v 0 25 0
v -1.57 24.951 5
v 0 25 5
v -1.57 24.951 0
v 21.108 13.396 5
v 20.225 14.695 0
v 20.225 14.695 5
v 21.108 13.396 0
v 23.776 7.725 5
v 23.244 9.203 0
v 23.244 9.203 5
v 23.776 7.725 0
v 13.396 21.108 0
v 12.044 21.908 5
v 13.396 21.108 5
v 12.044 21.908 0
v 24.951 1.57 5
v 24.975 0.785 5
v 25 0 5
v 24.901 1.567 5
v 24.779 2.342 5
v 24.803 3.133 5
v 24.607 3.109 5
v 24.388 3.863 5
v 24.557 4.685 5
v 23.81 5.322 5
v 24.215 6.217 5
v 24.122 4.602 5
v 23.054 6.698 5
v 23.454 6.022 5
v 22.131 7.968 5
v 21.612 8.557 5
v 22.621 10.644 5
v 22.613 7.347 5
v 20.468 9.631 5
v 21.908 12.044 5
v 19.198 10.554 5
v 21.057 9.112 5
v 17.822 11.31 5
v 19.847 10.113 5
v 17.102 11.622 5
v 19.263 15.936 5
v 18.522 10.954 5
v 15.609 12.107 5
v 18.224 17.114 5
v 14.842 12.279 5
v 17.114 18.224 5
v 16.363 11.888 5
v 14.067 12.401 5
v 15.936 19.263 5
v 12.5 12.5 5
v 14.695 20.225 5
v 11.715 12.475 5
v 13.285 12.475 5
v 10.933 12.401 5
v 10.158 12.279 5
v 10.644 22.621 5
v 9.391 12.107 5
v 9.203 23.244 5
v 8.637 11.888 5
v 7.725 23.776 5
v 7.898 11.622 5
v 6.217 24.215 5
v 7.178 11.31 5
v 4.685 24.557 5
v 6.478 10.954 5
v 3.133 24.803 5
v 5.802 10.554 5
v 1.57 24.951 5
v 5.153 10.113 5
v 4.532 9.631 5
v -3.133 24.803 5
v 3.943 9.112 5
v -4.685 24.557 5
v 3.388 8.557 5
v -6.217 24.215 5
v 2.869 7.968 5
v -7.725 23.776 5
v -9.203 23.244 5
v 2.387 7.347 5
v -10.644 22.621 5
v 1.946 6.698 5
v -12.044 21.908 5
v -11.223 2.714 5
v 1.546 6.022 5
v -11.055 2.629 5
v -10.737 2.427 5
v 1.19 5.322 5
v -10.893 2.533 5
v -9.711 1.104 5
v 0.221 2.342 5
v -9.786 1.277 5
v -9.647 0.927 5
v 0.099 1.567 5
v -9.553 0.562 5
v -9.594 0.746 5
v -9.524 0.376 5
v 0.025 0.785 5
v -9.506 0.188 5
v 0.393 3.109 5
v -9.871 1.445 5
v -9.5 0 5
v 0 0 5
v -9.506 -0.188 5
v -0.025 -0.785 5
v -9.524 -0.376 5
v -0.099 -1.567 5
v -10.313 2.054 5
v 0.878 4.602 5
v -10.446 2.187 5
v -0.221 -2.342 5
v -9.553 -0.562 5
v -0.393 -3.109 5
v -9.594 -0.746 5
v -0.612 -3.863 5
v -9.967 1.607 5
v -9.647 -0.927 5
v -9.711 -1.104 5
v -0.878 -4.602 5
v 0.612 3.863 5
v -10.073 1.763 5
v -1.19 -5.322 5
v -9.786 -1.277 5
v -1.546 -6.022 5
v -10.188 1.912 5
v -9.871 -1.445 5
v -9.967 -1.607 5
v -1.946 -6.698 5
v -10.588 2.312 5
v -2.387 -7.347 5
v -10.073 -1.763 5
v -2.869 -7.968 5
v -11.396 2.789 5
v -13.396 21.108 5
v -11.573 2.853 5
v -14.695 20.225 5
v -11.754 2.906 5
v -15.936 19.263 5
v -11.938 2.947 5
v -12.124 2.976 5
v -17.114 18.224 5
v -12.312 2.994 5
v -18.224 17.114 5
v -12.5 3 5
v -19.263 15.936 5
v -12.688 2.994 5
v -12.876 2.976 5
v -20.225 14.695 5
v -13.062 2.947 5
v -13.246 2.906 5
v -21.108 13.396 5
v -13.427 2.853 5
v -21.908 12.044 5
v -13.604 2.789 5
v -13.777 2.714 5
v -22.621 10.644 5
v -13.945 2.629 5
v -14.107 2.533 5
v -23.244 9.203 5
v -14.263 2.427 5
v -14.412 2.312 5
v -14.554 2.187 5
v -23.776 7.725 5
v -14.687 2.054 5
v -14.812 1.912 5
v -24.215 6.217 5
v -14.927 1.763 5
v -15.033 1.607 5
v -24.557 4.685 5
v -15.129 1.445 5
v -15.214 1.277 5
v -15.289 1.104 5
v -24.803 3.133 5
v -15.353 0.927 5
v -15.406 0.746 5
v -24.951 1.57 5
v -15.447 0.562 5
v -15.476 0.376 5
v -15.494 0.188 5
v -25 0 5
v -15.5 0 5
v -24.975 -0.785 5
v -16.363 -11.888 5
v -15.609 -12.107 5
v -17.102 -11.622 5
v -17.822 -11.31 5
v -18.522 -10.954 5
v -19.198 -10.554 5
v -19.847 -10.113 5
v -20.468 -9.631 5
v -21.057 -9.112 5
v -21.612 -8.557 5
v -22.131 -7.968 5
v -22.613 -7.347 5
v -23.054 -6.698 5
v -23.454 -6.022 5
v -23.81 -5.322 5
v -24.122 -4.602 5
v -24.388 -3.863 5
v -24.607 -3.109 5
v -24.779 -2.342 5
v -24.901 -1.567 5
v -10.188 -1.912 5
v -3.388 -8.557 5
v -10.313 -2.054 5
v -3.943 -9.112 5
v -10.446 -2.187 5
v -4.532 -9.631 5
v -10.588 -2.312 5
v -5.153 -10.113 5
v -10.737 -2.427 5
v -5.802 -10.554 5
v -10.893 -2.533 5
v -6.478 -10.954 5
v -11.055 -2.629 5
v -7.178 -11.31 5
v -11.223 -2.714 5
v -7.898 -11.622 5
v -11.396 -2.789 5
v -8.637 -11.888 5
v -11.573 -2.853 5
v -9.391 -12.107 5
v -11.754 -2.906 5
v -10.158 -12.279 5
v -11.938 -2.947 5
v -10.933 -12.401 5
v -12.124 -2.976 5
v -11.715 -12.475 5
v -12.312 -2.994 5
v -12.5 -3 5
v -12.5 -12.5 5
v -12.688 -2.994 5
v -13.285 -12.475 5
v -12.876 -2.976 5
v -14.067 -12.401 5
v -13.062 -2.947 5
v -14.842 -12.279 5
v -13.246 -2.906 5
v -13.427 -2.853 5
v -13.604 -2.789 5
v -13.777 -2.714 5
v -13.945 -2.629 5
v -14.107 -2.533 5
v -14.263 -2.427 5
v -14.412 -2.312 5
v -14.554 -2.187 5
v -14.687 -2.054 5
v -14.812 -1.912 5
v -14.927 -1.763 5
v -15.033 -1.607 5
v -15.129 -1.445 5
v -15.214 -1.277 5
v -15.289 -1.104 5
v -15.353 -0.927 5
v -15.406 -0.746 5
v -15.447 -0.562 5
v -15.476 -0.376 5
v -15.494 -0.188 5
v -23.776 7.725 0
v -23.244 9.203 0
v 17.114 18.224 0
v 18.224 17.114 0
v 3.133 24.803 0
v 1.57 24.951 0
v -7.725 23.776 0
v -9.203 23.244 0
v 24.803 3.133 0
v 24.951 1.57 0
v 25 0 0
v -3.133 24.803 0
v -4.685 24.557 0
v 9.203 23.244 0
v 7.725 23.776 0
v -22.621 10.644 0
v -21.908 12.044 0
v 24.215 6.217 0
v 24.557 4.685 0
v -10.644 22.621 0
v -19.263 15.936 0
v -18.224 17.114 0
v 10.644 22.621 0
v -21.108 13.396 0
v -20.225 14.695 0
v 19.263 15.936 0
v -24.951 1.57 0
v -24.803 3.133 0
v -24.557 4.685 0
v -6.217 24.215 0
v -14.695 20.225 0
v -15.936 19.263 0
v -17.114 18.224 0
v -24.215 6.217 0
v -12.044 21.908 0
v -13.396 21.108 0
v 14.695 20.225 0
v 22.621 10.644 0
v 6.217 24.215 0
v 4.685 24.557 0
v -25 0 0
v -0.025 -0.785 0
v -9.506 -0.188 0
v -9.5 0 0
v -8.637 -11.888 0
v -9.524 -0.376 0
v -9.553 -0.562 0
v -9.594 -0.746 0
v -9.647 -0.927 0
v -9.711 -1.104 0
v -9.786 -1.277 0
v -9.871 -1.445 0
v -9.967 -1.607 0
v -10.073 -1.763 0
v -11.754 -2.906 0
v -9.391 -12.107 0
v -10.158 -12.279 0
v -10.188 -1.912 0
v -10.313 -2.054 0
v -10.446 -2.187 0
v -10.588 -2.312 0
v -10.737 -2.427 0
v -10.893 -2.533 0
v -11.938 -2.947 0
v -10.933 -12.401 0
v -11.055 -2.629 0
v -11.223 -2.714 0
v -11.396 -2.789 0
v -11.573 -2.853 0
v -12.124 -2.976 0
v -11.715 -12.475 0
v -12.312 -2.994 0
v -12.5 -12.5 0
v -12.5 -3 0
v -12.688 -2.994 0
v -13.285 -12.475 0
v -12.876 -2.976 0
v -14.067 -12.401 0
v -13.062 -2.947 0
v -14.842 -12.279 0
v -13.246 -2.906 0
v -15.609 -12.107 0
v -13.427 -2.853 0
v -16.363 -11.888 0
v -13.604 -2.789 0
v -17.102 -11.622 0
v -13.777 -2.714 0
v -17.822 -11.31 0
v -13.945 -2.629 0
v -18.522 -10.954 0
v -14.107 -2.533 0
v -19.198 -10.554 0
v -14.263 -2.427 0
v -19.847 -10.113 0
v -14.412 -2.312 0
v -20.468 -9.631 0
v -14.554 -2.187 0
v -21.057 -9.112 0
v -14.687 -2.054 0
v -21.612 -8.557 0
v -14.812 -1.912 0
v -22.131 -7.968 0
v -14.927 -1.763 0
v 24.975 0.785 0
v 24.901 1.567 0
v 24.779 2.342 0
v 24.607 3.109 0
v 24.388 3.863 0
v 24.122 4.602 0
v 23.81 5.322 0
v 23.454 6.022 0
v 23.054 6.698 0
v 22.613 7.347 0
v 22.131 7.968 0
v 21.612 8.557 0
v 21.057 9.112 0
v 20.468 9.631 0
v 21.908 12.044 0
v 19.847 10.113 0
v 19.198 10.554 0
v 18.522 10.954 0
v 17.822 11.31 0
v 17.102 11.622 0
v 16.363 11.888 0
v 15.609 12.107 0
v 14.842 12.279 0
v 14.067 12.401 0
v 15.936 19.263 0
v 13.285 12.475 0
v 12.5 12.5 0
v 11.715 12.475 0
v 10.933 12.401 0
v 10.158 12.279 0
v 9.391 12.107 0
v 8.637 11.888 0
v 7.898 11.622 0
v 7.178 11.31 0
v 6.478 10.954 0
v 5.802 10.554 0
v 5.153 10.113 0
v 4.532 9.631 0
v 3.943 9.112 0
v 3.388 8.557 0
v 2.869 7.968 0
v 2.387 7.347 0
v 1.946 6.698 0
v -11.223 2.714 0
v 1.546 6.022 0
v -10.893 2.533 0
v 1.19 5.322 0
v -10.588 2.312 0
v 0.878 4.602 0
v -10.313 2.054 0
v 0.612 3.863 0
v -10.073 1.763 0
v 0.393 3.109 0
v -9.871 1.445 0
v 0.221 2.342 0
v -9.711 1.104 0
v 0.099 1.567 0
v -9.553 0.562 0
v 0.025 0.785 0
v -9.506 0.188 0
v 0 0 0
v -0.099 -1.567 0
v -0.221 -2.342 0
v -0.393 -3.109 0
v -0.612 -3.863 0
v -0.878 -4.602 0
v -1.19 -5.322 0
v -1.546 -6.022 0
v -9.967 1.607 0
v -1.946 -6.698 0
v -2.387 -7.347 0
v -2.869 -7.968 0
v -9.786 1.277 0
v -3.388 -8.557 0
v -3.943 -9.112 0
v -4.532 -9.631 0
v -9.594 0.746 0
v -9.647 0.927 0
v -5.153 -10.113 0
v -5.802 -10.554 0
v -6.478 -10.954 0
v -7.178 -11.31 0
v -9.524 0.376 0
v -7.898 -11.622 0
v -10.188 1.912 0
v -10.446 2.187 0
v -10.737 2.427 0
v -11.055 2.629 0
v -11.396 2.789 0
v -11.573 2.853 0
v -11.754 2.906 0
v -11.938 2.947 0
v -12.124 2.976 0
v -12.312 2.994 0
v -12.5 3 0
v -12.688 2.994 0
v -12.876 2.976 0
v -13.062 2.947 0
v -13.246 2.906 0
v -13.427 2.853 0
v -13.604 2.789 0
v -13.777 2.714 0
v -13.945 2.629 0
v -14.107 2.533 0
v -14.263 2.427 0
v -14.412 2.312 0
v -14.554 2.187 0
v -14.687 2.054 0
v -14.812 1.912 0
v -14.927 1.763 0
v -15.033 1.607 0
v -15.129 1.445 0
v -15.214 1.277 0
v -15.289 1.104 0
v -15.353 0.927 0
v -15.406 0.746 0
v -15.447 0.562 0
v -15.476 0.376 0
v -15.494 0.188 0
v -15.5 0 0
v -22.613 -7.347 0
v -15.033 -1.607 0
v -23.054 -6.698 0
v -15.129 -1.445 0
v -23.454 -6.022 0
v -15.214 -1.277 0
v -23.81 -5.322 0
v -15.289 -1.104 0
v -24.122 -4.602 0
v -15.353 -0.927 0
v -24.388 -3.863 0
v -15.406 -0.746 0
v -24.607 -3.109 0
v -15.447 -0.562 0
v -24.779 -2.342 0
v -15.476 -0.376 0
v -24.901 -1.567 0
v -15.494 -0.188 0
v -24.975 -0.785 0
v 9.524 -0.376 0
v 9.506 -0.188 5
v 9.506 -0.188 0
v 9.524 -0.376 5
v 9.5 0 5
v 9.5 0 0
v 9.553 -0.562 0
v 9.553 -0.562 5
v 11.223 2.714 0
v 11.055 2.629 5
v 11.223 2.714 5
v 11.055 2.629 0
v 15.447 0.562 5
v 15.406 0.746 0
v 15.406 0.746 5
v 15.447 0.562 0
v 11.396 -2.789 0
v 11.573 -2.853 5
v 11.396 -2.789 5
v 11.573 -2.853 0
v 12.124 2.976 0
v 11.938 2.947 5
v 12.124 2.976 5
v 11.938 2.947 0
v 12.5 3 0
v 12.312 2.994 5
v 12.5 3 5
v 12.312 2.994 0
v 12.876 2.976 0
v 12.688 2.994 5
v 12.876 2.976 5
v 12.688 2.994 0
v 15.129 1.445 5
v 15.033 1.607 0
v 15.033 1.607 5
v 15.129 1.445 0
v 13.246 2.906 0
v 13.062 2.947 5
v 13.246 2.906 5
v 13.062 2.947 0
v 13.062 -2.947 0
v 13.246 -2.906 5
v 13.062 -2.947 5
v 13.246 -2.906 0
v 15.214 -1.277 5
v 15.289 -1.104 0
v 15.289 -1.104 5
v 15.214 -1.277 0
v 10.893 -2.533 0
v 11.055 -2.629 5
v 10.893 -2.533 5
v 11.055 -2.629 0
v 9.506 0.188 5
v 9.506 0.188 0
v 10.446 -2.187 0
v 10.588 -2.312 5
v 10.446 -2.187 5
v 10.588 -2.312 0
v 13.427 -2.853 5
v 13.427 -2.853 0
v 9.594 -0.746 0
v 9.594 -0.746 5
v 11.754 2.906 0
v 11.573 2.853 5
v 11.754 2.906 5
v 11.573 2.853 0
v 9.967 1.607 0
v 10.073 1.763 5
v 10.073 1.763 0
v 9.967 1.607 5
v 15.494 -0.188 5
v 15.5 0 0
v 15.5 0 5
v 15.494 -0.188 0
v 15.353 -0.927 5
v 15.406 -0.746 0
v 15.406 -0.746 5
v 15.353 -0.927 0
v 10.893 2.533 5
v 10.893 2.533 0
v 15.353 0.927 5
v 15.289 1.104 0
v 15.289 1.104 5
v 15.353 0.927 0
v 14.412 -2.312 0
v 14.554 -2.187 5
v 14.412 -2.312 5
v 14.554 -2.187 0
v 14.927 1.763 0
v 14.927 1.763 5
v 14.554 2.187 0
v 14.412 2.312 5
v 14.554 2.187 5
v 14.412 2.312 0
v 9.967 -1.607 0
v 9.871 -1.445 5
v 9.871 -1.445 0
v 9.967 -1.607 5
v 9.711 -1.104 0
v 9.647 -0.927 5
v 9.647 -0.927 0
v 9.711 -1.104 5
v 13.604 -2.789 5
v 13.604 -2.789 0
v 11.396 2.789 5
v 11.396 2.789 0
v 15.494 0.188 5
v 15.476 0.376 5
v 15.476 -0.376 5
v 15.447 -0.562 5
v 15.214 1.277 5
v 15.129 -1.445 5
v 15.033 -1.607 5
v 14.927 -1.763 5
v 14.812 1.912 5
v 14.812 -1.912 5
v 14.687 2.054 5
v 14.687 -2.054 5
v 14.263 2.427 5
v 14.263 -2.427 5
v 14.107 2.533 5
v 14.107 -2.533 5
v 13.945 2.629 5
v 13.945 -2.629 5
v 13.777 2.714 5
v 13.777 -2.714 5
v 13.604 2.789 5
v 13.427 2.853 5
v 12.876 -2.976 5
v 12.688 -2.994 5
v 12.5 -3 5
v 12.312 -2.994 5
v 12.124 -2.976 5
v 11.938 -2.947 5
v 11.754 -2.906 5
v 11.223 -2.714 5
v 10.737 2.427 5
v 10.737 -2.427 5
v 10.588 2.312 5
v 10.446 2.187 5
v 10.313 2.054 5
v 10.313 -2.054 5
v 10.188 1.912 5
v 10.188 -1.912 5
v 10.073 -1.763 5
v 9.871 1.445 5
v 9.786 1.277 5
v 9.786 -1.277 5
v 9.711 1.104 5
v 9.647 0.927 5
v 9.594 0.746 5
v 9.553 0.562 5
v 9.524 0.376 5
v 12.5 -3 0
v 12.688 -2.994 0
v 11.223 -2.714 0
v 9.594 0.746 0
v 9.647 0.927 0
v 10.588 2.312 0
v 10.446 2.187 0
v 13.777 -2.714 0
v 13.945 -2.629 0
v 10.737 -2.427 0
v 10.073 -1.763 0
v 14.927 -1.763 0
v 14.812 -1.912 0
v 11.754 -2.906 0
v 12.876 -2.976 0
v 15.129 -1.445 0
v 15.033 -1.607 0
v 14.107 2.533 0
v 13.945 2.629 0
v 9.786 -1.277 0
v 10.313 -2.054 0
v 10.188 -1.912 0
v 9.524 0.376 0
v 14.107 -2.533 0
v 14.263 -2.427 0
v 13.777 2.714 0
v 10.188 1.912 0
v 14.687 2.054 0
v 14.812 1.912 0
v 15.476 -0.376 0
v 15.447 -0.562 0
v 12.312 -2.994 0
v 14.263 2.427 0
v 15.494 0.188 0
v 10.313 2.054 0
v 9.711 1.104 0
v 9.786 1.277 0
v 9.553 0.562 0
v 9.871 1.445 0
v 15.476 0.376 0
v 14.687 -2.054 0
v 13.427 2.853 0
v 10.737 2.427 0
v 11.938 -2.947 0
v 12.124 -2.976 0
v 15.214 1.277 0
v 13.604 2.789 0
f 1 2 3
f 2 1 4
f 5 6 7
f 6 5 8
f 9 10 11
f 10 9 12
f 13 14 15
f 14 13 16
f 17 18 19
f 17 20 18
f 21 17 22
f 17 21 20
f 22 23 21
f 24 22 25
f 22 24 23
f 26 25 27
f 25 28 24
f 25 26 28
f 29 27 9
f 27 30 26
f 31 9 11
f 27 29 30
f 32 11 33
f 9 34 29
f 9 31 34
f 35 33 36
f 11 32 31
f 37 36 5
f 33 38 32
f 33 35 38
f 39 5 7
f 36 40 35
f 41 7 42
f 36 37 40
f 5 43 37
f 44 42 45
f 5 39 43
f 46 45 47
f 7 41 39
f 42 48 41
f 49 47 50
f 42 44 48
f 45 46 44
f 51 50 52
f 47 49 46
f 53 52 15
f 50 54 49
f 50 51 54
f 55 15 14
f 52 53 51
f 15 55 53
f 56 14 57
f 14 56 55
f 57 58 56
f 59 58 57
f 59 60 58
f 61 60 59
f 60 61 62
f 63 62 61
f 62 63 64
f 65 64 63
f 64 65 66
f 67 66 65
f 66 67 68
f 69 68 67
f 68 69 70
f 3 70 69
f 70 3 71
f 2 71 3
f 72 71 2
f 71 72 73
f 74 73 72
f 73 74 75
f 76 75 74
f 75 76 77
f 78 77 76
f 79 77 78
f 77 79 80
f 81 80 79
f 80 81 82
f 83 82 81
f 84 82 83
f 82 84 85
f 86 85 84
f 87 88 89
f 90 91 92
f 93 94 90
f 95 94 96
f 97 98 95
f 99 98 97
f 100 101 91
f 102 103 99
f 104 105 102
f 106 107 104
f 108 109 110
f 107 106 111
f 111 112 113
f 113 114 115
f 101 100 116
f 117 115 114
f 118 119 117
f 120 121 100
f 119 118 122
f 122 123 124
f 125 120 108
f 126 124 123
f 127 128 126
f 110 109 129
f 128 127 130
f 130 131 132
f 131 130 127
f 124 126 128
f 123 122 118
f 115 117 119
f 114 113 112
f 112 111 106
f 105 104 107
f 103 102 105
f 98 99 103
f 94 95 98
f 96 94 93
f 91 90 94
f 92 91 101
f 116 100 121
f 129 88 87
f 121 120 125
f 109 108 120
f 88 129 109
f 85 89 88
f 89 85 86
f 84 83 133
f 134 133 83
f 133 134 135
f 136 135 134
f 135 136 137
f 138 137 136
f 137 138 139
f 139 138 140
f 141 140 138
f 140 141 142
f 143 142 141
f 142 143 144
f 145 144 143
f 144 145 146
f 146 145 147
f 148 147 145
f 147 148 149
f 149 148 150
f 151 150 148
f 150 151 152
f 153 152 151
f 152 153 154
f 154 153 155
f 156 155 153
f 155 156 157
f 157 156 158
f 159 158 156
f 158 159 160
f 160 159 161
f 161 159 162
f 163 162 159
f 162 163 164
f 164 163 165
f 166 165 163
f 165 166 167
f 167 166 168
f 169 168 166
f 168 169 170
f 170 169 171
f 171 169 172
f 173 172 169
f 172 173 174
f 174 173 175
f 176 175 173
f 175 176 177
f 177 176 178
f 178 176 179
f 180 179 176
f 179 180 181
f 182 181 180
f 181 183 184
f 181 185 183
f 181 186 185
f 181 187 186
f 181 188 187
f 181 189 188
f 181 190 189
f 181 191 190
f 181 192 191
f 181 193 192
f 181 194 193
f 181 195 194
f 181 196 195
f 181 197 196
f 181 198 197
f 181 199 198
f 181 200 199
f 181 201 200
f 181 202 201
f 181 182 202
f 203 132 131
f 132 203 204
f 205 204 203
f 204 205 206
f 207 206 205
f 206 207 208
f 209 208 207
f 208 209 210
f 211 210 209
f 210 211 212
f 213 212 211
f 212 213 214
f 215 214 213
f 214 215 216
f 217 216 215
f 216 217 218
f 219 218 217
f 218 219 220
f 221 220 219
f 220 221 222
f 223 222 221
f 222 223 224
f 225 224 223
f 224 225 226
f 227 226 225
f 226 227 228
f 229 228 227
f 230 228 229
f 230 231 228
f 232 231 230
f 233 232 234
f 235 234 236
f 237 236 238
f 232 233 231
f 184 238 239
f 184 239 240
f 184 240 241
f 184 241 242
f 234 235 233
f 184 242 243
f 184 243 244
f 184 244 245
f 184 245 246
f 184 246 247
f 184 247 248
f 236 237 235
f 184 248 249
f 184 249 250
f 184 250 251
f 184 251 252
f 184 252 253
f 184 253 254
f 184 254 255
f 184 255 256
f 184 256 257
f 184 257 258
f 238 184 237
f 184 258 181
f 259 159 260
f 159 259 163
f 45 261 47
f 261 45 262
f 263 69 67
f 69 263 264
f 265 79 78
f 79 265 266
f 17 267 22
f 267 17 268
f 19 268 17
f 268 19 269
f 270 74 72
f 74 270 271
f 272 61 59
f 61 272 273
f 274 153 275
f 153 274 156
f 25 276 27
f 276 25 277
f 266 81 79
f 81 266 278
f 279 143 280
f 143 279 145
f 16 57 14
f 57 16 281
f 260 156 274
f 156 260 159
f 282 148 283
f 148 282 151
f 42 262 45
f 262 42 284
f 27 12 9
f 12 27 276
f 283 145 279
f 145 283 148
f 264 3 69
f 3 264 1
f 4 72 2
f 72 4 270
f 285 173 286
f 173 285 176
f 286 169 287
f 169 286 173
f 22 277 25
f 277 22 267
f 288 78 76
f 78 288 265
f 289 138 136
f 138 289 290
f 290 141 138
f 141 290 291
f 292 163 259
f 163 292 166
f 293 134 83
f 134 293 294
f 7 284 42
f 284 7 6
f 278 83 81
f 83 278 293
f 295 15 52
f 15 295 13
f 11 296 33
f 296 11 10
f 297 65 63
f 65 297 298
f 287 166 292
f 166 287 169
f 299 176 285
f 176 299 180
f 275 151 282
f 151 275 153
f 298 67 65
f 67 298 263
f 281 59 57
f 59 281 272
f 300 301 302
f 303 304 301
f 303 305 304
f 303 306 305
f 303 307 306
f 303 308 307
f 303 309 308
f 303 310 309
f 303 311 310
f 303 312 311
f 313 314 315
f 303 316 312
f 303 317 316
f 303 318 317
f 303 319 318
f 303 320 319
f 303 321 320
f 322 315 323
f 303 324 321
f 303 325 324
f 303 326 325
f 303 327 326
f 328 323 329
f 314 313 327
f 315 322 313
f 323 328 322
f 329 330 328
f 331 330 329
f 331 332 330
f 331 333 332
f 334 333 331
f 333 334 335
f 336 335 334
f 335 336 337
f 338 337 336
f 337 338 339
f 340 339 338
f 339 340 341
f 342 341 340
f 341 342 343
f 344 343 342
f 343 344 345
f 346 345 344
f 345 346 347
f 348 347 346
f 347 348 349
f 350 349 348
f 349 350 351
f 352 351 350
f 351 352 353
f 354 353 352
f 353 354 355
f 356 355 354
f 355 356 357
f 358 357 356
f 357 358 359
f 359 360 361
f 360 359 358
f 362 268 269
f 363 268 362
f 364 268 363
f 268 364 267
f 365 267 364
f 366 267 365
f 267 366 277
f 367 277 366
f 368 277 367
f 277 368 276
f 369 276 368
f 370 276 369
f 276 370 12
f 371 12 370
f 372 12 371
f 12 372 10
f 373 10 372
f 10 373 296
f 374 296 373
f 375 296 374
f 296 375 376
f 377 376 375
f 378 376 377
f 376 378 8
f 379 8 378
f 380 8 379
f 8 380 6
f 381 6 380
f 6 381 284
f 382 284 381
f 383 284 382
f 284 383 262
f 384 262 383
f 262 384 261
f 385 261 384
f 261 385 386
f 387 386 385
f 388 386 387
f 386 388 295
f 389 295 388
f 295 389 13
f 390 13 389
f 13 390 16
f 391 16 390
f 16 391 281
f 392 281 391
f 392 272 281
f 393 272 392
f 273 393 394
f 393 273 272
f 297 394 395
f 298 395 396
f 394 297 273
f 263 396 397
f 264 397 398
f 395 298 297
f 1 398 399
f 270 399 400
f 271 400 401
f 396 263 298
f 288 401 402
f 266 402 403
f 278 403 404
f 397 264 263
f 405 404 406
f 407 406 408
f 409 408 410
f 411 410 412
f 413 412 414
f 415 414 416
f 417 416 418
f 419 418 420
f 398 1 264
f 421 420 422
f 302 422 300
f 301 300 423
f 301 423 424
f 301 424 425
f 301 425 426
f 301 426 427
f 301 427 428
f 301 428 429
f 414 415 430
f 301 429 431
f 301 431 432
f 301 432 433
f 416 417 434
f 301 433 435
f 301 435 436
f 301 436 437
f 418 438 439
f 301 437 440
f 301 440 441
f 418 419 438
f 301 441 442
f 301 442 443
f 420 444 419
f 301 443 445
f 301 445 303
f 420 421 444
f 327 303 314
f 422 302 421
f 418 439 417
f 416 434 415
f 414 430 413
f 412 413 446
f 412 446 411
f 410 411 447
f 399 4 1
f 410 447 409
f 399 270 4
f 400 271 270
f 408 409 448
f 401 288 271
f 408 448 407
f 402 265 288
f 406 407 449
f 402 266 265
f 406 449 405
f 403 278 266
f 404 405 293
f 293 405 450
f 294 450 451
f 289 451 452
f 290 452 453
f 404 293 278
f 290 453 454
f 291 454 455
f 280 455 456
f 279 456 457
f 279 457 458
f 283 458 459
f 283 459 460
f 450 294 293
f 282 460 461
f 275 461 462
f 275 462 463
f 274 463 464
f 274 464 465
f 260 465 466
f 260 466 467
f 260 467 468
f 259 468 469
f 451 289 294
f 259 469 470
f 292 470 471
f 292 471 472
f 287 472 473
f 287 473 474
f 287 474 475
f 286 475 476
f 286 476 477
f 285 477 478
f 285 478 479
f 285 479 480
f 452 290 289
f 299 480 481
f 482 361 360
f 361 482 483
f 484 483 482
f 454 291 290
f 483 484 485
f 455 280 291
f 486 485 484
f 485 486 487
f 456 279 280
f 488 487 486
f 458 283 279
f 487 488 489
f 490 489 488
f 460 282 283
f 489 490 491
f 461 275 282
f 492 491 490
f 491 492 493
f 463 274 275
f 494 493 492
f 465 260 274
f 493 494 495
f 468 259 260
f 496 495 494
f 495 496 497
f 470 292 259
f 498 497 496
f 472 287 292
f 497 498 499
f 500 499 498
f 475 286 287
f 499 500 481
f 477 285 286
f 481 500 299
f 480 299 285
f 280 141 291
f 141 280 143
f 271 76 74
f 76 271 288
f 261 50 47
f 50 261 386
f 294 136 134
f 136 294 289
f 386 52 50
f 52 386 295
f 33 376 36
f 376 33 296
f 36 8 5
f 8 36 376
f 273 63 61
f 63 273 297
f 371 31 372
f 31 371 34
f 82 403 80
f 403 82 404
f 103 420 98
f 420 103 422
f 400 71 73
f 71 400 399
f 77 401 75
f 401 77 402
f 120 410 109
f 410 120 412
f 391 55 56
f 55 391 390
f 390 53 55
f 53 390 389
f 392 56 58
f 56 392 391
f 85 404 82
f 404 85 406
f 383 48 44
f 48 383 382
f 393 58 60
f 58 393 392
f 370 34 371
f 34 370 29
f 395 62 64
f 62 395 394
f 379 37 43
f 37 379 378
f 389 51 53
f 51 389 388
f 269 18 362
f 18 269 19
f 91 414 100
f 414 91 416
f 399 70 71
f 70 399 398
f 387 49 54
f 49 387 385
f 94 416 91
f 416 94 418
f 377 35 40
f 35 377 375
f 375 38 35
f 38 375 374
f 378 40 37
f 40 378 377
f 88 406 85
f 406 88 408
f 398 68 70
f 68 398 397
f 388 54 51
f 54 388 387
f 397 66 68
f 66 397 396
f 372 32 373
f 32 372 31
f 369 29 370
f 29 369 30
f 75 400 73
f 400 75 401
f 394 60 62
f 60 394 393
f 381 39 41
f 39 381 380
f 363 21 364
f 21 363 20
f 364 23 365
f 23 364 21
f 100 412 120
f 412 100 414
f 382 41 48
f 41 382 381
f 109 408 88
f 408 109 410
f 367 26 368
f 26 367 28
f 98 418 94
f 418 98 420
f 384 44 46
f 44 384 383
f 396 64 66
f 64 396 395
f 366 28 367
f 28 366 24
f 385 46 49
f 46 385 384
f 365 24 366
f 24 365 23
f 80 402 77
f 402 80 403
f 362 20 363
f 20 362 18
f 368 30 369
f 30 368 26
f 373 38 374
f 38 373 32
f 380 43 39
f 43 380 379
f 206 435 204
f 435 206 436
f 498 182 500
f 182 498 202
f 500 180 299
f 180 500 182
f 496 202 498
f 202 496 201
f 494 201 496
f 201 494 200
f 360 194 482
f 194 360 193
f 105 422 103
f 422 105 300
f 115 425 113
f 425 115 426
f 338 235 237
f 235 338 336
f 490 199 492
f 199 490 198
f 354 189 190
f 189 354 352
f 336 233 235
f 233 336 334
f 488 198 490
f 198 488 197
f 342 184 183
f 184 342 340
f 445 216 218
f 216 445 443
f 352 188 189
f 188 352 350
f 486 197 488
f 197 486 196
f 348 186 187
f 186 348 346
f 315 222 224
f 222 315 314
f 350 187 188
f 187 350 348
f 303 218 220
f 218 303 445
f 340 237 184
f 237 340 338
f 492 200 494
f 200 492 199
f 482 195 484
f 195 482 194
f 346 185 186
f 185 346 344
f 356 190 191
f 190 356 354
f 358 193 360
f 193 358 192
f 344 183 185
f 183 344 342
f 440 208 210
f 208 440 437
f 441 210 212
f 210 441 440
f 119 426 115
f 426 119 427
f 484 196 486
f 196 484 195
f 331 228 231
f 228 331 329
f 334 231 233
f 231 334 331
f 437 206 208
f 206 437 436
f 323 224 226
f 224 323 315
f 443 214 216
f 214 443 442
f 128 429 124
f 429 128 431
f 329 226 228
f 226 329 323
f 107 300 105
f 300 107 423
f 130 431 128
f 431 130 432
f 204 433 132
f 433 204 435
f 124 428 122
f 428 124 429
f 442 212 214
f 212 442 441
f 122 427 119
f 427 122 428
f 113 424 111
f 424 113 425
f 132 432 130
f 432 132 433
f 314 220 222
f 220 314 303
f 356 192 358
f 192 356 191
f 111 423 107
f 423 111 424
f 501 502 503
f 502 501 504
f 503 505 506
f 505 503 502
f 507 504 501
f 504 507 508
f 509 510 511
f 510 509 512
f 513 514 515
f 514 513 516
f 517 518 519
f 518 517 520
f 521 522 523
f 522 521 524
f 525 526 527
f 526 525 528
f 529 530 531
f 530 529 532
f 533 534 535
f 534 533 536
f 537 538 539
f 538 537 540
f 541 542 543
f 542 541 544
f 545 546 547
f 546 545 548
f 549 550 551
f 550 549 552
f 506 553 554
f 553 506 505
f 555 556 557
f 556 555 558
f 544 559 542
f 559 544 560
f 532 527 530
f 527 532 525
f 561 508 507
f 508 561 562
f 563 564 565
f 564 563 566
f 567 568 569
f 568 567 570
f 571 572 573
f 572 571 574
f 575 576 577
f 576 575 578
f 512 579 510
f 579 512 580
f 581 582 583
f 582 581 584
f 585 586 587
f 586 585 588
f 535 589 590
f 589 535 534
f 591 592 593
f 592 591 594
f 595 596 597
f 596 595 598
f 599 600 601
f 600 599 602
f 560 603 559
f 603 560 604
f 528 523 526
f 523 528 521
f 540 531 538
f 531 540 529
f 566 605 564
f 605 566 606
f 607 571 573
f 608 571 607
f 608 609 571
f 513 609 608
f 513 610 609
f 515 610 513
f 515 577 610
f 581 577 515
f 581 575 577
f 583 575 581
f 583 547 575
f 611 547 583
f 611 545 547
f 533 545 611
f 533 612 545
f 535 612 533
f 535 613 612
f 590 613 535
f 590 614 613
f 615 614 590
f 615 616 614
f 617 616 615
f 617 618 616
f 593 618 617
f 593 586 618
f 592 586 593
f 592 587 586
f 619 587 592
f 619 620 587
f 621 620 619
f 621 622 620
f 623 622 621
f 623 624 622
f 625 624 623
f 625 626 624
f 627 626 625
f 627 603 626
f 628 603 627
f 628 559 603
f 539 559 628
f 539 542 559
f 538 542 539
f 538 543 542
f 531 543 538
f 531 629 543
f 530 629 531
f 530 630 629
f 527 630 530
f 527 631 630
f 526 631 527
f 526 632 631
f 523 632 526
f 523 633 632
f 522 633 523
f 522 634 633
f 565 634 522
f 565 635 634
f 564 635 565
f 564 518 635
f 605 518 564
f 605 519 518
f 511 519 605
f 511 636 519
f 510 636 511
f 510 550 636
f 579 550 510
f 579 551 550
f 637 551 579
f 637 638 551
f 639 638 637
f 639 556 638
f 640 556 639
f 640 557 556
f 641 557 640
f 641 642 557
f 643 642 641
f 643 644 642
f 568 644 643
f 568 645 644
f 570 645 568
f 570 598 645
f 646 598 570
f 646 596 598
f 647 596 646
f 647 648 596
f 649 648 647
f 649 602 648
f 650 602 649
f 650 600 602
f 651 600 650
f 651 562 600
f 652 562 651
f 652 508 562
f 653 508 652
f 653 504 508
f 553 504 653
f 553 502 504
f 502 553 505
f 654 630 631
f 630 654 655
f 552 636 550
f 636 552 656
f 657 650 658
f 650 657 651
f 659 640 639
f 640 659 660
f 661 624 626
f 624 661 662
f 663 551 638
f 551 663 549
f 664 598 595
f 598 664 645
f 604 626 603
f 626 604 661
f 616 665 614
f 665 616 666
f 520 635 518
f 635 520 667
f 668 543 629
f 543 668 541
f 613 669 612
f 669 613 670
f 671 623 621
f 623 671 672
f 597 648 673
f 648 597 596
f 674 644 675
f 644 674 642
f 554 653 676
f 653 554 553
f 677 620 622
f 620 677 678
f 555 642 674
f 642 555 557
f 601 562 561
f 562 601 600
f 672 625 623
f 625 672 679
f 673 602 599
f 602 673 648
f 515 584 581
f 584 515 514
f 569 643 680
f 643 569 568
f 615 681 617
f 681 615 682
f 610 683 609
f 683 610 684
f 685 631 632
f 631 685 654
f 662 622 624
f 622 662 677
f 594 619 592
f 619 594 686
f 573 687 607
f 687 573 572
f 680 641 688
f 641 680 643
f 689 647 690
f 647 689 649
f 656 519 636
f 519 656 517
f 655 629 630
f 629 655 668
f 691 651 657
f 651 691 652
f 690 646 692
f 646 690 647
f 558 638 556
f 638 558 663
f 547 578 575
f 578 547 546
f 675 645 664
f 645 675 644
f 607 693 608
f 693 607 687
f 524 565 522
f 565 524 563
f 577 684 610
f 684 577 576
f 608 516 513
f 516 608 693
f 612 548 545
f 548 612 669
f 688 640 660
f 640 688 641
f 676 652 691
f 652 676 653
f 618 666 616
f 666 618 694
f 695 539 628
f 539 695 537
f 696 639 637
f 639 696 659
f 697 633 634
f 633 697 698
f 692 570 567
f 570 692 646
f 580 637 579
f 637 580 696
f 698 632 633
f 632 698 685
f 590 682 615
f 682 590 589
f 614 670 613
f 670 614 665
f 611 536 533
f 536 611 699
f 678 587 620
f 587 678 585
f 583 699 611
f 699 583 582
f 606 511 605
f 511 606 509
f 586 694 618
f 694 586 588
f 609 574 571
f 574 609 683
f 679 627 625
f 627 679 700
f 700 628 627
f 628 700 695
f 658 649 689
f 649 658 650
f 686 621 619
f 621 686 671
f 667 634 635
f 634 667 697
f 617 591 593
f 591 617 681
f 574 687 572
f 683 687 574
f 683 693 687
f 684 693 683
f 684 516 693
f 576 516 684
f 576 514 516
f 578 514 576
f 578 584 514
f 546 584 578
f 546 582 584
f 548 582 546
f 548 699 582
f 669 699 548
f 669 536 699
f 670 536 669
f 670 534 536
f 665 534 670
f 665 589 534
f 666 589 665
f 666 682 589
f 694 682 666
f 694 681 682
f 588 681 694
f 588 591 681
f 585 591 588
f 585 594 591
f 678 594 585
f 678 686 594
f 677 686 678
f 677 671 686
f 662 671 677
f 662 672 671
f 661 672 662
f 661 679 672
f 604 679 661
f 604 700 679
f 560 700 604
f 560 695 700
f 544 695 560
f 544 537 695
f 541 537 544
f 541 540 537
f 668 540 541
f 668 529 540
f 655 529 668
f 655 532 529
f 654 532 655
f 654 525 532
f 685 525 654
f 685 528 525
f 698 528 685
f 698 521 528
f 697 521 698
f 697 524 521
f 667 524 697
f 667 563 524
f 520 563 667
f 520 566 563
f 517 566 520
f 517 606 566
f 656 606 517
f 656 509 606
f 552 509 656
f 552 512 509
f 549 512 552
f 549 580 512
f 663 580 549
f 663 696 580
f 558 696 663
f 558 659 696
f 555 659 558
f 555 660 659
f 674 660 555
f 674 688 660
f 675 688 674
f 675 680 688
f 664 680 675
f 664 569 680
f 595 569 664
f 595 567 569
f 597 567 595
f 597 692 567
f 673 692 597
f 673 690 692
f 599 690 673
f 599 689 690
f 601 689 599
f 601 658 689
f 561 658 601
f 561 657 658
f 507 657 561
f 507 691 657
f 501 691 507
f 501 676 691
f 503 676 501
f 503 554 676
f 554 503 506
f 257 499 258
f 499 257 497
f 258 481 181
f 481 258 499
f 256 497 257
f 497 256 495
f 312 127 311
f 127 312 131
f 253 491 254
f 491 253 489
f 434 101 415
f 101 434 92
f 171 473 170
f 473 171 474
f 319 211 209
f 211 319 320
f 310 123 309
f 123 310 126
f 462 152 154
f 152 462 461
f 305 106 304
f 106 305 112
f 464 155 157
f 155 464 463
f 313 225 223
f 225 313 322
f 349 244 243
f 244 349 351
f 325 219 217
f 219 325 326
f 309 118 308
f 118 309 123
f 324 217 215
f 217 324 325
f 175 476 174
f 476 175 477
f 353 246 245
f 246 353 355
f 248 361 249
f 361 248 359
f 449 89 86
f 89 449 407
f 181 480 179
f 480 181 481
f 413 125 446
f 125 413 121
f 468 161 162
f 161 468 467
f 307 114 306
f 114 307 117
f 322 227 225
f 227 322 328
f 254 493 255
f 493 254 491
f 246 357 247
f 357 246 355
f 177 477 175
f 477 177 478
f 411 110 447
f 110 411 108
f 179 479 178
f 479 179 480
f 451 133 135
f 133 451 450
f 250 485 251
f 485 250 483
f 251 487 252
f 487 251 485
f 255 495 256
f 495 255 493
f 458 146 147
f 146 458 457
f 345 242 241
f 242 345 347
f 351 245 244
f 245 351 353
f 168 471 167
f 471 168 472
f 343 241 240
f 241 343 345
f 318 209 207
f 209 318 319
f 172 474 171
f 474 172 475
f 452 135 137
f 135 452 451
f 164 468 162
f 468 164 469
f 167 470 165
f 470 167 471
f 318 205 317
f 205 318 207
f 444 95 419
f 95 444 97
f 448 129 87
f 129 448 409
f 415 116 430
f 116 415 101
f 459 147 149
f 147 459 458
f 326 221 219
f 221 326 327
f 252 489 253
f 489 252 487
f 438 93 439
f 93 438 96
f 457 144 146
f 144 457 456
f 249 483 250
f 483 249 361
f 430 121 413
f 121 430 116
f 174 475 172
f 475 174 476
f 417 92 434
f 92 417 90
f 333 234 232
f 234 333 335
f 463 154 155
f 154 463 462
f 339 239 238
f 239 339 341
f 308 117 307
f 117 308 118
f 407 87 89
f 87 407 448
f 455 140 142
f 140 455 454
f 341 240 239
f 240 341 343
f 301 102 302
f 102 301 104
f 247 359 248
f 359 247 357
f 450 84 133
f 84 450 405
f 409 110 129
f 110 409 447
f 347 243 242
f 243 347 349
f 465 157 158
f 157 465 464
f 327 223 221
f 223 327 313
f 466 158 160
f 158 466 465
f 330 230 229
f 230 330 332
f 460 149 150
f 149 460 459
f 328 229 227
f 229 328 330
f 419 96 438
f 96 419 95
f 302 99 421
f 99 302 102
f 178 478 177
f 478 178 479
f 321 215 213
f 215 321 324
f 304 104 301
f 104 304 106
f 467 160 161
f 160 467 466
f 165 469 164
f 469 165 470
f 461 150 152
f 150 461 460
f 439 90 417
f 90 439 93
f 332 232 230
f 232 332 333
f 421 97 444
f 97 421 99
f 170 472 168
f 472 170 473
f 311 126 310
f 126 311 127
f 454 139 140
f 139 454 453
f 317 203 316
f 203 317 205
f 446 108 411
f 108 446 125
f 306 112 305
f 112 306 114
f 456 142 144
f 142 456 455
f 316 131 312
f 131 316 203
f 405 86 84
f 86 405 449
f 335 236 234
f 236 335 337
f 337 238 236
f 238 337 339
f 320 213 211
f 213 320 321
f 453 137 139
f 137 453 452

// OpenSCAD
module yinyang(height, radius, dotRadius, fn) {
    difference() {
        union() {
            difference() {
                cylinder(h=height, r=radius, $fn=fn); //Basic outer shape.
                translate([-radius, 0, 0]) {
                    cube([radius * 2, radius, height]); //Cut half of the cylinder away.
                }
                translate([-radius / 2, 0, 0]) {
                    cylinder(h=height, r=radius / 2, $fn=fn); //Circle cut out to produce the thin tail.
                }
            }
            translate([radius / 2, 0, 0]) {
                cylinder(h = height, r = radius / 2, $fn=fn); //Circle added to produce the round head.
            }
            translate([-radius / 2, 0, 0]) {
                cylinder(h = height, r = dotRadius, $fn=fn);
            }
        }
        translate([radius / 2, 0, 0]) {
            cylinder(h = height, r = dotRadius, $fn=fn);
        }
    }
}

//Comment to create yang.
rotate([0, 0, 180])
{
    yinyang(height=5, radius=25, dotRadius=3, fn=100);
}
